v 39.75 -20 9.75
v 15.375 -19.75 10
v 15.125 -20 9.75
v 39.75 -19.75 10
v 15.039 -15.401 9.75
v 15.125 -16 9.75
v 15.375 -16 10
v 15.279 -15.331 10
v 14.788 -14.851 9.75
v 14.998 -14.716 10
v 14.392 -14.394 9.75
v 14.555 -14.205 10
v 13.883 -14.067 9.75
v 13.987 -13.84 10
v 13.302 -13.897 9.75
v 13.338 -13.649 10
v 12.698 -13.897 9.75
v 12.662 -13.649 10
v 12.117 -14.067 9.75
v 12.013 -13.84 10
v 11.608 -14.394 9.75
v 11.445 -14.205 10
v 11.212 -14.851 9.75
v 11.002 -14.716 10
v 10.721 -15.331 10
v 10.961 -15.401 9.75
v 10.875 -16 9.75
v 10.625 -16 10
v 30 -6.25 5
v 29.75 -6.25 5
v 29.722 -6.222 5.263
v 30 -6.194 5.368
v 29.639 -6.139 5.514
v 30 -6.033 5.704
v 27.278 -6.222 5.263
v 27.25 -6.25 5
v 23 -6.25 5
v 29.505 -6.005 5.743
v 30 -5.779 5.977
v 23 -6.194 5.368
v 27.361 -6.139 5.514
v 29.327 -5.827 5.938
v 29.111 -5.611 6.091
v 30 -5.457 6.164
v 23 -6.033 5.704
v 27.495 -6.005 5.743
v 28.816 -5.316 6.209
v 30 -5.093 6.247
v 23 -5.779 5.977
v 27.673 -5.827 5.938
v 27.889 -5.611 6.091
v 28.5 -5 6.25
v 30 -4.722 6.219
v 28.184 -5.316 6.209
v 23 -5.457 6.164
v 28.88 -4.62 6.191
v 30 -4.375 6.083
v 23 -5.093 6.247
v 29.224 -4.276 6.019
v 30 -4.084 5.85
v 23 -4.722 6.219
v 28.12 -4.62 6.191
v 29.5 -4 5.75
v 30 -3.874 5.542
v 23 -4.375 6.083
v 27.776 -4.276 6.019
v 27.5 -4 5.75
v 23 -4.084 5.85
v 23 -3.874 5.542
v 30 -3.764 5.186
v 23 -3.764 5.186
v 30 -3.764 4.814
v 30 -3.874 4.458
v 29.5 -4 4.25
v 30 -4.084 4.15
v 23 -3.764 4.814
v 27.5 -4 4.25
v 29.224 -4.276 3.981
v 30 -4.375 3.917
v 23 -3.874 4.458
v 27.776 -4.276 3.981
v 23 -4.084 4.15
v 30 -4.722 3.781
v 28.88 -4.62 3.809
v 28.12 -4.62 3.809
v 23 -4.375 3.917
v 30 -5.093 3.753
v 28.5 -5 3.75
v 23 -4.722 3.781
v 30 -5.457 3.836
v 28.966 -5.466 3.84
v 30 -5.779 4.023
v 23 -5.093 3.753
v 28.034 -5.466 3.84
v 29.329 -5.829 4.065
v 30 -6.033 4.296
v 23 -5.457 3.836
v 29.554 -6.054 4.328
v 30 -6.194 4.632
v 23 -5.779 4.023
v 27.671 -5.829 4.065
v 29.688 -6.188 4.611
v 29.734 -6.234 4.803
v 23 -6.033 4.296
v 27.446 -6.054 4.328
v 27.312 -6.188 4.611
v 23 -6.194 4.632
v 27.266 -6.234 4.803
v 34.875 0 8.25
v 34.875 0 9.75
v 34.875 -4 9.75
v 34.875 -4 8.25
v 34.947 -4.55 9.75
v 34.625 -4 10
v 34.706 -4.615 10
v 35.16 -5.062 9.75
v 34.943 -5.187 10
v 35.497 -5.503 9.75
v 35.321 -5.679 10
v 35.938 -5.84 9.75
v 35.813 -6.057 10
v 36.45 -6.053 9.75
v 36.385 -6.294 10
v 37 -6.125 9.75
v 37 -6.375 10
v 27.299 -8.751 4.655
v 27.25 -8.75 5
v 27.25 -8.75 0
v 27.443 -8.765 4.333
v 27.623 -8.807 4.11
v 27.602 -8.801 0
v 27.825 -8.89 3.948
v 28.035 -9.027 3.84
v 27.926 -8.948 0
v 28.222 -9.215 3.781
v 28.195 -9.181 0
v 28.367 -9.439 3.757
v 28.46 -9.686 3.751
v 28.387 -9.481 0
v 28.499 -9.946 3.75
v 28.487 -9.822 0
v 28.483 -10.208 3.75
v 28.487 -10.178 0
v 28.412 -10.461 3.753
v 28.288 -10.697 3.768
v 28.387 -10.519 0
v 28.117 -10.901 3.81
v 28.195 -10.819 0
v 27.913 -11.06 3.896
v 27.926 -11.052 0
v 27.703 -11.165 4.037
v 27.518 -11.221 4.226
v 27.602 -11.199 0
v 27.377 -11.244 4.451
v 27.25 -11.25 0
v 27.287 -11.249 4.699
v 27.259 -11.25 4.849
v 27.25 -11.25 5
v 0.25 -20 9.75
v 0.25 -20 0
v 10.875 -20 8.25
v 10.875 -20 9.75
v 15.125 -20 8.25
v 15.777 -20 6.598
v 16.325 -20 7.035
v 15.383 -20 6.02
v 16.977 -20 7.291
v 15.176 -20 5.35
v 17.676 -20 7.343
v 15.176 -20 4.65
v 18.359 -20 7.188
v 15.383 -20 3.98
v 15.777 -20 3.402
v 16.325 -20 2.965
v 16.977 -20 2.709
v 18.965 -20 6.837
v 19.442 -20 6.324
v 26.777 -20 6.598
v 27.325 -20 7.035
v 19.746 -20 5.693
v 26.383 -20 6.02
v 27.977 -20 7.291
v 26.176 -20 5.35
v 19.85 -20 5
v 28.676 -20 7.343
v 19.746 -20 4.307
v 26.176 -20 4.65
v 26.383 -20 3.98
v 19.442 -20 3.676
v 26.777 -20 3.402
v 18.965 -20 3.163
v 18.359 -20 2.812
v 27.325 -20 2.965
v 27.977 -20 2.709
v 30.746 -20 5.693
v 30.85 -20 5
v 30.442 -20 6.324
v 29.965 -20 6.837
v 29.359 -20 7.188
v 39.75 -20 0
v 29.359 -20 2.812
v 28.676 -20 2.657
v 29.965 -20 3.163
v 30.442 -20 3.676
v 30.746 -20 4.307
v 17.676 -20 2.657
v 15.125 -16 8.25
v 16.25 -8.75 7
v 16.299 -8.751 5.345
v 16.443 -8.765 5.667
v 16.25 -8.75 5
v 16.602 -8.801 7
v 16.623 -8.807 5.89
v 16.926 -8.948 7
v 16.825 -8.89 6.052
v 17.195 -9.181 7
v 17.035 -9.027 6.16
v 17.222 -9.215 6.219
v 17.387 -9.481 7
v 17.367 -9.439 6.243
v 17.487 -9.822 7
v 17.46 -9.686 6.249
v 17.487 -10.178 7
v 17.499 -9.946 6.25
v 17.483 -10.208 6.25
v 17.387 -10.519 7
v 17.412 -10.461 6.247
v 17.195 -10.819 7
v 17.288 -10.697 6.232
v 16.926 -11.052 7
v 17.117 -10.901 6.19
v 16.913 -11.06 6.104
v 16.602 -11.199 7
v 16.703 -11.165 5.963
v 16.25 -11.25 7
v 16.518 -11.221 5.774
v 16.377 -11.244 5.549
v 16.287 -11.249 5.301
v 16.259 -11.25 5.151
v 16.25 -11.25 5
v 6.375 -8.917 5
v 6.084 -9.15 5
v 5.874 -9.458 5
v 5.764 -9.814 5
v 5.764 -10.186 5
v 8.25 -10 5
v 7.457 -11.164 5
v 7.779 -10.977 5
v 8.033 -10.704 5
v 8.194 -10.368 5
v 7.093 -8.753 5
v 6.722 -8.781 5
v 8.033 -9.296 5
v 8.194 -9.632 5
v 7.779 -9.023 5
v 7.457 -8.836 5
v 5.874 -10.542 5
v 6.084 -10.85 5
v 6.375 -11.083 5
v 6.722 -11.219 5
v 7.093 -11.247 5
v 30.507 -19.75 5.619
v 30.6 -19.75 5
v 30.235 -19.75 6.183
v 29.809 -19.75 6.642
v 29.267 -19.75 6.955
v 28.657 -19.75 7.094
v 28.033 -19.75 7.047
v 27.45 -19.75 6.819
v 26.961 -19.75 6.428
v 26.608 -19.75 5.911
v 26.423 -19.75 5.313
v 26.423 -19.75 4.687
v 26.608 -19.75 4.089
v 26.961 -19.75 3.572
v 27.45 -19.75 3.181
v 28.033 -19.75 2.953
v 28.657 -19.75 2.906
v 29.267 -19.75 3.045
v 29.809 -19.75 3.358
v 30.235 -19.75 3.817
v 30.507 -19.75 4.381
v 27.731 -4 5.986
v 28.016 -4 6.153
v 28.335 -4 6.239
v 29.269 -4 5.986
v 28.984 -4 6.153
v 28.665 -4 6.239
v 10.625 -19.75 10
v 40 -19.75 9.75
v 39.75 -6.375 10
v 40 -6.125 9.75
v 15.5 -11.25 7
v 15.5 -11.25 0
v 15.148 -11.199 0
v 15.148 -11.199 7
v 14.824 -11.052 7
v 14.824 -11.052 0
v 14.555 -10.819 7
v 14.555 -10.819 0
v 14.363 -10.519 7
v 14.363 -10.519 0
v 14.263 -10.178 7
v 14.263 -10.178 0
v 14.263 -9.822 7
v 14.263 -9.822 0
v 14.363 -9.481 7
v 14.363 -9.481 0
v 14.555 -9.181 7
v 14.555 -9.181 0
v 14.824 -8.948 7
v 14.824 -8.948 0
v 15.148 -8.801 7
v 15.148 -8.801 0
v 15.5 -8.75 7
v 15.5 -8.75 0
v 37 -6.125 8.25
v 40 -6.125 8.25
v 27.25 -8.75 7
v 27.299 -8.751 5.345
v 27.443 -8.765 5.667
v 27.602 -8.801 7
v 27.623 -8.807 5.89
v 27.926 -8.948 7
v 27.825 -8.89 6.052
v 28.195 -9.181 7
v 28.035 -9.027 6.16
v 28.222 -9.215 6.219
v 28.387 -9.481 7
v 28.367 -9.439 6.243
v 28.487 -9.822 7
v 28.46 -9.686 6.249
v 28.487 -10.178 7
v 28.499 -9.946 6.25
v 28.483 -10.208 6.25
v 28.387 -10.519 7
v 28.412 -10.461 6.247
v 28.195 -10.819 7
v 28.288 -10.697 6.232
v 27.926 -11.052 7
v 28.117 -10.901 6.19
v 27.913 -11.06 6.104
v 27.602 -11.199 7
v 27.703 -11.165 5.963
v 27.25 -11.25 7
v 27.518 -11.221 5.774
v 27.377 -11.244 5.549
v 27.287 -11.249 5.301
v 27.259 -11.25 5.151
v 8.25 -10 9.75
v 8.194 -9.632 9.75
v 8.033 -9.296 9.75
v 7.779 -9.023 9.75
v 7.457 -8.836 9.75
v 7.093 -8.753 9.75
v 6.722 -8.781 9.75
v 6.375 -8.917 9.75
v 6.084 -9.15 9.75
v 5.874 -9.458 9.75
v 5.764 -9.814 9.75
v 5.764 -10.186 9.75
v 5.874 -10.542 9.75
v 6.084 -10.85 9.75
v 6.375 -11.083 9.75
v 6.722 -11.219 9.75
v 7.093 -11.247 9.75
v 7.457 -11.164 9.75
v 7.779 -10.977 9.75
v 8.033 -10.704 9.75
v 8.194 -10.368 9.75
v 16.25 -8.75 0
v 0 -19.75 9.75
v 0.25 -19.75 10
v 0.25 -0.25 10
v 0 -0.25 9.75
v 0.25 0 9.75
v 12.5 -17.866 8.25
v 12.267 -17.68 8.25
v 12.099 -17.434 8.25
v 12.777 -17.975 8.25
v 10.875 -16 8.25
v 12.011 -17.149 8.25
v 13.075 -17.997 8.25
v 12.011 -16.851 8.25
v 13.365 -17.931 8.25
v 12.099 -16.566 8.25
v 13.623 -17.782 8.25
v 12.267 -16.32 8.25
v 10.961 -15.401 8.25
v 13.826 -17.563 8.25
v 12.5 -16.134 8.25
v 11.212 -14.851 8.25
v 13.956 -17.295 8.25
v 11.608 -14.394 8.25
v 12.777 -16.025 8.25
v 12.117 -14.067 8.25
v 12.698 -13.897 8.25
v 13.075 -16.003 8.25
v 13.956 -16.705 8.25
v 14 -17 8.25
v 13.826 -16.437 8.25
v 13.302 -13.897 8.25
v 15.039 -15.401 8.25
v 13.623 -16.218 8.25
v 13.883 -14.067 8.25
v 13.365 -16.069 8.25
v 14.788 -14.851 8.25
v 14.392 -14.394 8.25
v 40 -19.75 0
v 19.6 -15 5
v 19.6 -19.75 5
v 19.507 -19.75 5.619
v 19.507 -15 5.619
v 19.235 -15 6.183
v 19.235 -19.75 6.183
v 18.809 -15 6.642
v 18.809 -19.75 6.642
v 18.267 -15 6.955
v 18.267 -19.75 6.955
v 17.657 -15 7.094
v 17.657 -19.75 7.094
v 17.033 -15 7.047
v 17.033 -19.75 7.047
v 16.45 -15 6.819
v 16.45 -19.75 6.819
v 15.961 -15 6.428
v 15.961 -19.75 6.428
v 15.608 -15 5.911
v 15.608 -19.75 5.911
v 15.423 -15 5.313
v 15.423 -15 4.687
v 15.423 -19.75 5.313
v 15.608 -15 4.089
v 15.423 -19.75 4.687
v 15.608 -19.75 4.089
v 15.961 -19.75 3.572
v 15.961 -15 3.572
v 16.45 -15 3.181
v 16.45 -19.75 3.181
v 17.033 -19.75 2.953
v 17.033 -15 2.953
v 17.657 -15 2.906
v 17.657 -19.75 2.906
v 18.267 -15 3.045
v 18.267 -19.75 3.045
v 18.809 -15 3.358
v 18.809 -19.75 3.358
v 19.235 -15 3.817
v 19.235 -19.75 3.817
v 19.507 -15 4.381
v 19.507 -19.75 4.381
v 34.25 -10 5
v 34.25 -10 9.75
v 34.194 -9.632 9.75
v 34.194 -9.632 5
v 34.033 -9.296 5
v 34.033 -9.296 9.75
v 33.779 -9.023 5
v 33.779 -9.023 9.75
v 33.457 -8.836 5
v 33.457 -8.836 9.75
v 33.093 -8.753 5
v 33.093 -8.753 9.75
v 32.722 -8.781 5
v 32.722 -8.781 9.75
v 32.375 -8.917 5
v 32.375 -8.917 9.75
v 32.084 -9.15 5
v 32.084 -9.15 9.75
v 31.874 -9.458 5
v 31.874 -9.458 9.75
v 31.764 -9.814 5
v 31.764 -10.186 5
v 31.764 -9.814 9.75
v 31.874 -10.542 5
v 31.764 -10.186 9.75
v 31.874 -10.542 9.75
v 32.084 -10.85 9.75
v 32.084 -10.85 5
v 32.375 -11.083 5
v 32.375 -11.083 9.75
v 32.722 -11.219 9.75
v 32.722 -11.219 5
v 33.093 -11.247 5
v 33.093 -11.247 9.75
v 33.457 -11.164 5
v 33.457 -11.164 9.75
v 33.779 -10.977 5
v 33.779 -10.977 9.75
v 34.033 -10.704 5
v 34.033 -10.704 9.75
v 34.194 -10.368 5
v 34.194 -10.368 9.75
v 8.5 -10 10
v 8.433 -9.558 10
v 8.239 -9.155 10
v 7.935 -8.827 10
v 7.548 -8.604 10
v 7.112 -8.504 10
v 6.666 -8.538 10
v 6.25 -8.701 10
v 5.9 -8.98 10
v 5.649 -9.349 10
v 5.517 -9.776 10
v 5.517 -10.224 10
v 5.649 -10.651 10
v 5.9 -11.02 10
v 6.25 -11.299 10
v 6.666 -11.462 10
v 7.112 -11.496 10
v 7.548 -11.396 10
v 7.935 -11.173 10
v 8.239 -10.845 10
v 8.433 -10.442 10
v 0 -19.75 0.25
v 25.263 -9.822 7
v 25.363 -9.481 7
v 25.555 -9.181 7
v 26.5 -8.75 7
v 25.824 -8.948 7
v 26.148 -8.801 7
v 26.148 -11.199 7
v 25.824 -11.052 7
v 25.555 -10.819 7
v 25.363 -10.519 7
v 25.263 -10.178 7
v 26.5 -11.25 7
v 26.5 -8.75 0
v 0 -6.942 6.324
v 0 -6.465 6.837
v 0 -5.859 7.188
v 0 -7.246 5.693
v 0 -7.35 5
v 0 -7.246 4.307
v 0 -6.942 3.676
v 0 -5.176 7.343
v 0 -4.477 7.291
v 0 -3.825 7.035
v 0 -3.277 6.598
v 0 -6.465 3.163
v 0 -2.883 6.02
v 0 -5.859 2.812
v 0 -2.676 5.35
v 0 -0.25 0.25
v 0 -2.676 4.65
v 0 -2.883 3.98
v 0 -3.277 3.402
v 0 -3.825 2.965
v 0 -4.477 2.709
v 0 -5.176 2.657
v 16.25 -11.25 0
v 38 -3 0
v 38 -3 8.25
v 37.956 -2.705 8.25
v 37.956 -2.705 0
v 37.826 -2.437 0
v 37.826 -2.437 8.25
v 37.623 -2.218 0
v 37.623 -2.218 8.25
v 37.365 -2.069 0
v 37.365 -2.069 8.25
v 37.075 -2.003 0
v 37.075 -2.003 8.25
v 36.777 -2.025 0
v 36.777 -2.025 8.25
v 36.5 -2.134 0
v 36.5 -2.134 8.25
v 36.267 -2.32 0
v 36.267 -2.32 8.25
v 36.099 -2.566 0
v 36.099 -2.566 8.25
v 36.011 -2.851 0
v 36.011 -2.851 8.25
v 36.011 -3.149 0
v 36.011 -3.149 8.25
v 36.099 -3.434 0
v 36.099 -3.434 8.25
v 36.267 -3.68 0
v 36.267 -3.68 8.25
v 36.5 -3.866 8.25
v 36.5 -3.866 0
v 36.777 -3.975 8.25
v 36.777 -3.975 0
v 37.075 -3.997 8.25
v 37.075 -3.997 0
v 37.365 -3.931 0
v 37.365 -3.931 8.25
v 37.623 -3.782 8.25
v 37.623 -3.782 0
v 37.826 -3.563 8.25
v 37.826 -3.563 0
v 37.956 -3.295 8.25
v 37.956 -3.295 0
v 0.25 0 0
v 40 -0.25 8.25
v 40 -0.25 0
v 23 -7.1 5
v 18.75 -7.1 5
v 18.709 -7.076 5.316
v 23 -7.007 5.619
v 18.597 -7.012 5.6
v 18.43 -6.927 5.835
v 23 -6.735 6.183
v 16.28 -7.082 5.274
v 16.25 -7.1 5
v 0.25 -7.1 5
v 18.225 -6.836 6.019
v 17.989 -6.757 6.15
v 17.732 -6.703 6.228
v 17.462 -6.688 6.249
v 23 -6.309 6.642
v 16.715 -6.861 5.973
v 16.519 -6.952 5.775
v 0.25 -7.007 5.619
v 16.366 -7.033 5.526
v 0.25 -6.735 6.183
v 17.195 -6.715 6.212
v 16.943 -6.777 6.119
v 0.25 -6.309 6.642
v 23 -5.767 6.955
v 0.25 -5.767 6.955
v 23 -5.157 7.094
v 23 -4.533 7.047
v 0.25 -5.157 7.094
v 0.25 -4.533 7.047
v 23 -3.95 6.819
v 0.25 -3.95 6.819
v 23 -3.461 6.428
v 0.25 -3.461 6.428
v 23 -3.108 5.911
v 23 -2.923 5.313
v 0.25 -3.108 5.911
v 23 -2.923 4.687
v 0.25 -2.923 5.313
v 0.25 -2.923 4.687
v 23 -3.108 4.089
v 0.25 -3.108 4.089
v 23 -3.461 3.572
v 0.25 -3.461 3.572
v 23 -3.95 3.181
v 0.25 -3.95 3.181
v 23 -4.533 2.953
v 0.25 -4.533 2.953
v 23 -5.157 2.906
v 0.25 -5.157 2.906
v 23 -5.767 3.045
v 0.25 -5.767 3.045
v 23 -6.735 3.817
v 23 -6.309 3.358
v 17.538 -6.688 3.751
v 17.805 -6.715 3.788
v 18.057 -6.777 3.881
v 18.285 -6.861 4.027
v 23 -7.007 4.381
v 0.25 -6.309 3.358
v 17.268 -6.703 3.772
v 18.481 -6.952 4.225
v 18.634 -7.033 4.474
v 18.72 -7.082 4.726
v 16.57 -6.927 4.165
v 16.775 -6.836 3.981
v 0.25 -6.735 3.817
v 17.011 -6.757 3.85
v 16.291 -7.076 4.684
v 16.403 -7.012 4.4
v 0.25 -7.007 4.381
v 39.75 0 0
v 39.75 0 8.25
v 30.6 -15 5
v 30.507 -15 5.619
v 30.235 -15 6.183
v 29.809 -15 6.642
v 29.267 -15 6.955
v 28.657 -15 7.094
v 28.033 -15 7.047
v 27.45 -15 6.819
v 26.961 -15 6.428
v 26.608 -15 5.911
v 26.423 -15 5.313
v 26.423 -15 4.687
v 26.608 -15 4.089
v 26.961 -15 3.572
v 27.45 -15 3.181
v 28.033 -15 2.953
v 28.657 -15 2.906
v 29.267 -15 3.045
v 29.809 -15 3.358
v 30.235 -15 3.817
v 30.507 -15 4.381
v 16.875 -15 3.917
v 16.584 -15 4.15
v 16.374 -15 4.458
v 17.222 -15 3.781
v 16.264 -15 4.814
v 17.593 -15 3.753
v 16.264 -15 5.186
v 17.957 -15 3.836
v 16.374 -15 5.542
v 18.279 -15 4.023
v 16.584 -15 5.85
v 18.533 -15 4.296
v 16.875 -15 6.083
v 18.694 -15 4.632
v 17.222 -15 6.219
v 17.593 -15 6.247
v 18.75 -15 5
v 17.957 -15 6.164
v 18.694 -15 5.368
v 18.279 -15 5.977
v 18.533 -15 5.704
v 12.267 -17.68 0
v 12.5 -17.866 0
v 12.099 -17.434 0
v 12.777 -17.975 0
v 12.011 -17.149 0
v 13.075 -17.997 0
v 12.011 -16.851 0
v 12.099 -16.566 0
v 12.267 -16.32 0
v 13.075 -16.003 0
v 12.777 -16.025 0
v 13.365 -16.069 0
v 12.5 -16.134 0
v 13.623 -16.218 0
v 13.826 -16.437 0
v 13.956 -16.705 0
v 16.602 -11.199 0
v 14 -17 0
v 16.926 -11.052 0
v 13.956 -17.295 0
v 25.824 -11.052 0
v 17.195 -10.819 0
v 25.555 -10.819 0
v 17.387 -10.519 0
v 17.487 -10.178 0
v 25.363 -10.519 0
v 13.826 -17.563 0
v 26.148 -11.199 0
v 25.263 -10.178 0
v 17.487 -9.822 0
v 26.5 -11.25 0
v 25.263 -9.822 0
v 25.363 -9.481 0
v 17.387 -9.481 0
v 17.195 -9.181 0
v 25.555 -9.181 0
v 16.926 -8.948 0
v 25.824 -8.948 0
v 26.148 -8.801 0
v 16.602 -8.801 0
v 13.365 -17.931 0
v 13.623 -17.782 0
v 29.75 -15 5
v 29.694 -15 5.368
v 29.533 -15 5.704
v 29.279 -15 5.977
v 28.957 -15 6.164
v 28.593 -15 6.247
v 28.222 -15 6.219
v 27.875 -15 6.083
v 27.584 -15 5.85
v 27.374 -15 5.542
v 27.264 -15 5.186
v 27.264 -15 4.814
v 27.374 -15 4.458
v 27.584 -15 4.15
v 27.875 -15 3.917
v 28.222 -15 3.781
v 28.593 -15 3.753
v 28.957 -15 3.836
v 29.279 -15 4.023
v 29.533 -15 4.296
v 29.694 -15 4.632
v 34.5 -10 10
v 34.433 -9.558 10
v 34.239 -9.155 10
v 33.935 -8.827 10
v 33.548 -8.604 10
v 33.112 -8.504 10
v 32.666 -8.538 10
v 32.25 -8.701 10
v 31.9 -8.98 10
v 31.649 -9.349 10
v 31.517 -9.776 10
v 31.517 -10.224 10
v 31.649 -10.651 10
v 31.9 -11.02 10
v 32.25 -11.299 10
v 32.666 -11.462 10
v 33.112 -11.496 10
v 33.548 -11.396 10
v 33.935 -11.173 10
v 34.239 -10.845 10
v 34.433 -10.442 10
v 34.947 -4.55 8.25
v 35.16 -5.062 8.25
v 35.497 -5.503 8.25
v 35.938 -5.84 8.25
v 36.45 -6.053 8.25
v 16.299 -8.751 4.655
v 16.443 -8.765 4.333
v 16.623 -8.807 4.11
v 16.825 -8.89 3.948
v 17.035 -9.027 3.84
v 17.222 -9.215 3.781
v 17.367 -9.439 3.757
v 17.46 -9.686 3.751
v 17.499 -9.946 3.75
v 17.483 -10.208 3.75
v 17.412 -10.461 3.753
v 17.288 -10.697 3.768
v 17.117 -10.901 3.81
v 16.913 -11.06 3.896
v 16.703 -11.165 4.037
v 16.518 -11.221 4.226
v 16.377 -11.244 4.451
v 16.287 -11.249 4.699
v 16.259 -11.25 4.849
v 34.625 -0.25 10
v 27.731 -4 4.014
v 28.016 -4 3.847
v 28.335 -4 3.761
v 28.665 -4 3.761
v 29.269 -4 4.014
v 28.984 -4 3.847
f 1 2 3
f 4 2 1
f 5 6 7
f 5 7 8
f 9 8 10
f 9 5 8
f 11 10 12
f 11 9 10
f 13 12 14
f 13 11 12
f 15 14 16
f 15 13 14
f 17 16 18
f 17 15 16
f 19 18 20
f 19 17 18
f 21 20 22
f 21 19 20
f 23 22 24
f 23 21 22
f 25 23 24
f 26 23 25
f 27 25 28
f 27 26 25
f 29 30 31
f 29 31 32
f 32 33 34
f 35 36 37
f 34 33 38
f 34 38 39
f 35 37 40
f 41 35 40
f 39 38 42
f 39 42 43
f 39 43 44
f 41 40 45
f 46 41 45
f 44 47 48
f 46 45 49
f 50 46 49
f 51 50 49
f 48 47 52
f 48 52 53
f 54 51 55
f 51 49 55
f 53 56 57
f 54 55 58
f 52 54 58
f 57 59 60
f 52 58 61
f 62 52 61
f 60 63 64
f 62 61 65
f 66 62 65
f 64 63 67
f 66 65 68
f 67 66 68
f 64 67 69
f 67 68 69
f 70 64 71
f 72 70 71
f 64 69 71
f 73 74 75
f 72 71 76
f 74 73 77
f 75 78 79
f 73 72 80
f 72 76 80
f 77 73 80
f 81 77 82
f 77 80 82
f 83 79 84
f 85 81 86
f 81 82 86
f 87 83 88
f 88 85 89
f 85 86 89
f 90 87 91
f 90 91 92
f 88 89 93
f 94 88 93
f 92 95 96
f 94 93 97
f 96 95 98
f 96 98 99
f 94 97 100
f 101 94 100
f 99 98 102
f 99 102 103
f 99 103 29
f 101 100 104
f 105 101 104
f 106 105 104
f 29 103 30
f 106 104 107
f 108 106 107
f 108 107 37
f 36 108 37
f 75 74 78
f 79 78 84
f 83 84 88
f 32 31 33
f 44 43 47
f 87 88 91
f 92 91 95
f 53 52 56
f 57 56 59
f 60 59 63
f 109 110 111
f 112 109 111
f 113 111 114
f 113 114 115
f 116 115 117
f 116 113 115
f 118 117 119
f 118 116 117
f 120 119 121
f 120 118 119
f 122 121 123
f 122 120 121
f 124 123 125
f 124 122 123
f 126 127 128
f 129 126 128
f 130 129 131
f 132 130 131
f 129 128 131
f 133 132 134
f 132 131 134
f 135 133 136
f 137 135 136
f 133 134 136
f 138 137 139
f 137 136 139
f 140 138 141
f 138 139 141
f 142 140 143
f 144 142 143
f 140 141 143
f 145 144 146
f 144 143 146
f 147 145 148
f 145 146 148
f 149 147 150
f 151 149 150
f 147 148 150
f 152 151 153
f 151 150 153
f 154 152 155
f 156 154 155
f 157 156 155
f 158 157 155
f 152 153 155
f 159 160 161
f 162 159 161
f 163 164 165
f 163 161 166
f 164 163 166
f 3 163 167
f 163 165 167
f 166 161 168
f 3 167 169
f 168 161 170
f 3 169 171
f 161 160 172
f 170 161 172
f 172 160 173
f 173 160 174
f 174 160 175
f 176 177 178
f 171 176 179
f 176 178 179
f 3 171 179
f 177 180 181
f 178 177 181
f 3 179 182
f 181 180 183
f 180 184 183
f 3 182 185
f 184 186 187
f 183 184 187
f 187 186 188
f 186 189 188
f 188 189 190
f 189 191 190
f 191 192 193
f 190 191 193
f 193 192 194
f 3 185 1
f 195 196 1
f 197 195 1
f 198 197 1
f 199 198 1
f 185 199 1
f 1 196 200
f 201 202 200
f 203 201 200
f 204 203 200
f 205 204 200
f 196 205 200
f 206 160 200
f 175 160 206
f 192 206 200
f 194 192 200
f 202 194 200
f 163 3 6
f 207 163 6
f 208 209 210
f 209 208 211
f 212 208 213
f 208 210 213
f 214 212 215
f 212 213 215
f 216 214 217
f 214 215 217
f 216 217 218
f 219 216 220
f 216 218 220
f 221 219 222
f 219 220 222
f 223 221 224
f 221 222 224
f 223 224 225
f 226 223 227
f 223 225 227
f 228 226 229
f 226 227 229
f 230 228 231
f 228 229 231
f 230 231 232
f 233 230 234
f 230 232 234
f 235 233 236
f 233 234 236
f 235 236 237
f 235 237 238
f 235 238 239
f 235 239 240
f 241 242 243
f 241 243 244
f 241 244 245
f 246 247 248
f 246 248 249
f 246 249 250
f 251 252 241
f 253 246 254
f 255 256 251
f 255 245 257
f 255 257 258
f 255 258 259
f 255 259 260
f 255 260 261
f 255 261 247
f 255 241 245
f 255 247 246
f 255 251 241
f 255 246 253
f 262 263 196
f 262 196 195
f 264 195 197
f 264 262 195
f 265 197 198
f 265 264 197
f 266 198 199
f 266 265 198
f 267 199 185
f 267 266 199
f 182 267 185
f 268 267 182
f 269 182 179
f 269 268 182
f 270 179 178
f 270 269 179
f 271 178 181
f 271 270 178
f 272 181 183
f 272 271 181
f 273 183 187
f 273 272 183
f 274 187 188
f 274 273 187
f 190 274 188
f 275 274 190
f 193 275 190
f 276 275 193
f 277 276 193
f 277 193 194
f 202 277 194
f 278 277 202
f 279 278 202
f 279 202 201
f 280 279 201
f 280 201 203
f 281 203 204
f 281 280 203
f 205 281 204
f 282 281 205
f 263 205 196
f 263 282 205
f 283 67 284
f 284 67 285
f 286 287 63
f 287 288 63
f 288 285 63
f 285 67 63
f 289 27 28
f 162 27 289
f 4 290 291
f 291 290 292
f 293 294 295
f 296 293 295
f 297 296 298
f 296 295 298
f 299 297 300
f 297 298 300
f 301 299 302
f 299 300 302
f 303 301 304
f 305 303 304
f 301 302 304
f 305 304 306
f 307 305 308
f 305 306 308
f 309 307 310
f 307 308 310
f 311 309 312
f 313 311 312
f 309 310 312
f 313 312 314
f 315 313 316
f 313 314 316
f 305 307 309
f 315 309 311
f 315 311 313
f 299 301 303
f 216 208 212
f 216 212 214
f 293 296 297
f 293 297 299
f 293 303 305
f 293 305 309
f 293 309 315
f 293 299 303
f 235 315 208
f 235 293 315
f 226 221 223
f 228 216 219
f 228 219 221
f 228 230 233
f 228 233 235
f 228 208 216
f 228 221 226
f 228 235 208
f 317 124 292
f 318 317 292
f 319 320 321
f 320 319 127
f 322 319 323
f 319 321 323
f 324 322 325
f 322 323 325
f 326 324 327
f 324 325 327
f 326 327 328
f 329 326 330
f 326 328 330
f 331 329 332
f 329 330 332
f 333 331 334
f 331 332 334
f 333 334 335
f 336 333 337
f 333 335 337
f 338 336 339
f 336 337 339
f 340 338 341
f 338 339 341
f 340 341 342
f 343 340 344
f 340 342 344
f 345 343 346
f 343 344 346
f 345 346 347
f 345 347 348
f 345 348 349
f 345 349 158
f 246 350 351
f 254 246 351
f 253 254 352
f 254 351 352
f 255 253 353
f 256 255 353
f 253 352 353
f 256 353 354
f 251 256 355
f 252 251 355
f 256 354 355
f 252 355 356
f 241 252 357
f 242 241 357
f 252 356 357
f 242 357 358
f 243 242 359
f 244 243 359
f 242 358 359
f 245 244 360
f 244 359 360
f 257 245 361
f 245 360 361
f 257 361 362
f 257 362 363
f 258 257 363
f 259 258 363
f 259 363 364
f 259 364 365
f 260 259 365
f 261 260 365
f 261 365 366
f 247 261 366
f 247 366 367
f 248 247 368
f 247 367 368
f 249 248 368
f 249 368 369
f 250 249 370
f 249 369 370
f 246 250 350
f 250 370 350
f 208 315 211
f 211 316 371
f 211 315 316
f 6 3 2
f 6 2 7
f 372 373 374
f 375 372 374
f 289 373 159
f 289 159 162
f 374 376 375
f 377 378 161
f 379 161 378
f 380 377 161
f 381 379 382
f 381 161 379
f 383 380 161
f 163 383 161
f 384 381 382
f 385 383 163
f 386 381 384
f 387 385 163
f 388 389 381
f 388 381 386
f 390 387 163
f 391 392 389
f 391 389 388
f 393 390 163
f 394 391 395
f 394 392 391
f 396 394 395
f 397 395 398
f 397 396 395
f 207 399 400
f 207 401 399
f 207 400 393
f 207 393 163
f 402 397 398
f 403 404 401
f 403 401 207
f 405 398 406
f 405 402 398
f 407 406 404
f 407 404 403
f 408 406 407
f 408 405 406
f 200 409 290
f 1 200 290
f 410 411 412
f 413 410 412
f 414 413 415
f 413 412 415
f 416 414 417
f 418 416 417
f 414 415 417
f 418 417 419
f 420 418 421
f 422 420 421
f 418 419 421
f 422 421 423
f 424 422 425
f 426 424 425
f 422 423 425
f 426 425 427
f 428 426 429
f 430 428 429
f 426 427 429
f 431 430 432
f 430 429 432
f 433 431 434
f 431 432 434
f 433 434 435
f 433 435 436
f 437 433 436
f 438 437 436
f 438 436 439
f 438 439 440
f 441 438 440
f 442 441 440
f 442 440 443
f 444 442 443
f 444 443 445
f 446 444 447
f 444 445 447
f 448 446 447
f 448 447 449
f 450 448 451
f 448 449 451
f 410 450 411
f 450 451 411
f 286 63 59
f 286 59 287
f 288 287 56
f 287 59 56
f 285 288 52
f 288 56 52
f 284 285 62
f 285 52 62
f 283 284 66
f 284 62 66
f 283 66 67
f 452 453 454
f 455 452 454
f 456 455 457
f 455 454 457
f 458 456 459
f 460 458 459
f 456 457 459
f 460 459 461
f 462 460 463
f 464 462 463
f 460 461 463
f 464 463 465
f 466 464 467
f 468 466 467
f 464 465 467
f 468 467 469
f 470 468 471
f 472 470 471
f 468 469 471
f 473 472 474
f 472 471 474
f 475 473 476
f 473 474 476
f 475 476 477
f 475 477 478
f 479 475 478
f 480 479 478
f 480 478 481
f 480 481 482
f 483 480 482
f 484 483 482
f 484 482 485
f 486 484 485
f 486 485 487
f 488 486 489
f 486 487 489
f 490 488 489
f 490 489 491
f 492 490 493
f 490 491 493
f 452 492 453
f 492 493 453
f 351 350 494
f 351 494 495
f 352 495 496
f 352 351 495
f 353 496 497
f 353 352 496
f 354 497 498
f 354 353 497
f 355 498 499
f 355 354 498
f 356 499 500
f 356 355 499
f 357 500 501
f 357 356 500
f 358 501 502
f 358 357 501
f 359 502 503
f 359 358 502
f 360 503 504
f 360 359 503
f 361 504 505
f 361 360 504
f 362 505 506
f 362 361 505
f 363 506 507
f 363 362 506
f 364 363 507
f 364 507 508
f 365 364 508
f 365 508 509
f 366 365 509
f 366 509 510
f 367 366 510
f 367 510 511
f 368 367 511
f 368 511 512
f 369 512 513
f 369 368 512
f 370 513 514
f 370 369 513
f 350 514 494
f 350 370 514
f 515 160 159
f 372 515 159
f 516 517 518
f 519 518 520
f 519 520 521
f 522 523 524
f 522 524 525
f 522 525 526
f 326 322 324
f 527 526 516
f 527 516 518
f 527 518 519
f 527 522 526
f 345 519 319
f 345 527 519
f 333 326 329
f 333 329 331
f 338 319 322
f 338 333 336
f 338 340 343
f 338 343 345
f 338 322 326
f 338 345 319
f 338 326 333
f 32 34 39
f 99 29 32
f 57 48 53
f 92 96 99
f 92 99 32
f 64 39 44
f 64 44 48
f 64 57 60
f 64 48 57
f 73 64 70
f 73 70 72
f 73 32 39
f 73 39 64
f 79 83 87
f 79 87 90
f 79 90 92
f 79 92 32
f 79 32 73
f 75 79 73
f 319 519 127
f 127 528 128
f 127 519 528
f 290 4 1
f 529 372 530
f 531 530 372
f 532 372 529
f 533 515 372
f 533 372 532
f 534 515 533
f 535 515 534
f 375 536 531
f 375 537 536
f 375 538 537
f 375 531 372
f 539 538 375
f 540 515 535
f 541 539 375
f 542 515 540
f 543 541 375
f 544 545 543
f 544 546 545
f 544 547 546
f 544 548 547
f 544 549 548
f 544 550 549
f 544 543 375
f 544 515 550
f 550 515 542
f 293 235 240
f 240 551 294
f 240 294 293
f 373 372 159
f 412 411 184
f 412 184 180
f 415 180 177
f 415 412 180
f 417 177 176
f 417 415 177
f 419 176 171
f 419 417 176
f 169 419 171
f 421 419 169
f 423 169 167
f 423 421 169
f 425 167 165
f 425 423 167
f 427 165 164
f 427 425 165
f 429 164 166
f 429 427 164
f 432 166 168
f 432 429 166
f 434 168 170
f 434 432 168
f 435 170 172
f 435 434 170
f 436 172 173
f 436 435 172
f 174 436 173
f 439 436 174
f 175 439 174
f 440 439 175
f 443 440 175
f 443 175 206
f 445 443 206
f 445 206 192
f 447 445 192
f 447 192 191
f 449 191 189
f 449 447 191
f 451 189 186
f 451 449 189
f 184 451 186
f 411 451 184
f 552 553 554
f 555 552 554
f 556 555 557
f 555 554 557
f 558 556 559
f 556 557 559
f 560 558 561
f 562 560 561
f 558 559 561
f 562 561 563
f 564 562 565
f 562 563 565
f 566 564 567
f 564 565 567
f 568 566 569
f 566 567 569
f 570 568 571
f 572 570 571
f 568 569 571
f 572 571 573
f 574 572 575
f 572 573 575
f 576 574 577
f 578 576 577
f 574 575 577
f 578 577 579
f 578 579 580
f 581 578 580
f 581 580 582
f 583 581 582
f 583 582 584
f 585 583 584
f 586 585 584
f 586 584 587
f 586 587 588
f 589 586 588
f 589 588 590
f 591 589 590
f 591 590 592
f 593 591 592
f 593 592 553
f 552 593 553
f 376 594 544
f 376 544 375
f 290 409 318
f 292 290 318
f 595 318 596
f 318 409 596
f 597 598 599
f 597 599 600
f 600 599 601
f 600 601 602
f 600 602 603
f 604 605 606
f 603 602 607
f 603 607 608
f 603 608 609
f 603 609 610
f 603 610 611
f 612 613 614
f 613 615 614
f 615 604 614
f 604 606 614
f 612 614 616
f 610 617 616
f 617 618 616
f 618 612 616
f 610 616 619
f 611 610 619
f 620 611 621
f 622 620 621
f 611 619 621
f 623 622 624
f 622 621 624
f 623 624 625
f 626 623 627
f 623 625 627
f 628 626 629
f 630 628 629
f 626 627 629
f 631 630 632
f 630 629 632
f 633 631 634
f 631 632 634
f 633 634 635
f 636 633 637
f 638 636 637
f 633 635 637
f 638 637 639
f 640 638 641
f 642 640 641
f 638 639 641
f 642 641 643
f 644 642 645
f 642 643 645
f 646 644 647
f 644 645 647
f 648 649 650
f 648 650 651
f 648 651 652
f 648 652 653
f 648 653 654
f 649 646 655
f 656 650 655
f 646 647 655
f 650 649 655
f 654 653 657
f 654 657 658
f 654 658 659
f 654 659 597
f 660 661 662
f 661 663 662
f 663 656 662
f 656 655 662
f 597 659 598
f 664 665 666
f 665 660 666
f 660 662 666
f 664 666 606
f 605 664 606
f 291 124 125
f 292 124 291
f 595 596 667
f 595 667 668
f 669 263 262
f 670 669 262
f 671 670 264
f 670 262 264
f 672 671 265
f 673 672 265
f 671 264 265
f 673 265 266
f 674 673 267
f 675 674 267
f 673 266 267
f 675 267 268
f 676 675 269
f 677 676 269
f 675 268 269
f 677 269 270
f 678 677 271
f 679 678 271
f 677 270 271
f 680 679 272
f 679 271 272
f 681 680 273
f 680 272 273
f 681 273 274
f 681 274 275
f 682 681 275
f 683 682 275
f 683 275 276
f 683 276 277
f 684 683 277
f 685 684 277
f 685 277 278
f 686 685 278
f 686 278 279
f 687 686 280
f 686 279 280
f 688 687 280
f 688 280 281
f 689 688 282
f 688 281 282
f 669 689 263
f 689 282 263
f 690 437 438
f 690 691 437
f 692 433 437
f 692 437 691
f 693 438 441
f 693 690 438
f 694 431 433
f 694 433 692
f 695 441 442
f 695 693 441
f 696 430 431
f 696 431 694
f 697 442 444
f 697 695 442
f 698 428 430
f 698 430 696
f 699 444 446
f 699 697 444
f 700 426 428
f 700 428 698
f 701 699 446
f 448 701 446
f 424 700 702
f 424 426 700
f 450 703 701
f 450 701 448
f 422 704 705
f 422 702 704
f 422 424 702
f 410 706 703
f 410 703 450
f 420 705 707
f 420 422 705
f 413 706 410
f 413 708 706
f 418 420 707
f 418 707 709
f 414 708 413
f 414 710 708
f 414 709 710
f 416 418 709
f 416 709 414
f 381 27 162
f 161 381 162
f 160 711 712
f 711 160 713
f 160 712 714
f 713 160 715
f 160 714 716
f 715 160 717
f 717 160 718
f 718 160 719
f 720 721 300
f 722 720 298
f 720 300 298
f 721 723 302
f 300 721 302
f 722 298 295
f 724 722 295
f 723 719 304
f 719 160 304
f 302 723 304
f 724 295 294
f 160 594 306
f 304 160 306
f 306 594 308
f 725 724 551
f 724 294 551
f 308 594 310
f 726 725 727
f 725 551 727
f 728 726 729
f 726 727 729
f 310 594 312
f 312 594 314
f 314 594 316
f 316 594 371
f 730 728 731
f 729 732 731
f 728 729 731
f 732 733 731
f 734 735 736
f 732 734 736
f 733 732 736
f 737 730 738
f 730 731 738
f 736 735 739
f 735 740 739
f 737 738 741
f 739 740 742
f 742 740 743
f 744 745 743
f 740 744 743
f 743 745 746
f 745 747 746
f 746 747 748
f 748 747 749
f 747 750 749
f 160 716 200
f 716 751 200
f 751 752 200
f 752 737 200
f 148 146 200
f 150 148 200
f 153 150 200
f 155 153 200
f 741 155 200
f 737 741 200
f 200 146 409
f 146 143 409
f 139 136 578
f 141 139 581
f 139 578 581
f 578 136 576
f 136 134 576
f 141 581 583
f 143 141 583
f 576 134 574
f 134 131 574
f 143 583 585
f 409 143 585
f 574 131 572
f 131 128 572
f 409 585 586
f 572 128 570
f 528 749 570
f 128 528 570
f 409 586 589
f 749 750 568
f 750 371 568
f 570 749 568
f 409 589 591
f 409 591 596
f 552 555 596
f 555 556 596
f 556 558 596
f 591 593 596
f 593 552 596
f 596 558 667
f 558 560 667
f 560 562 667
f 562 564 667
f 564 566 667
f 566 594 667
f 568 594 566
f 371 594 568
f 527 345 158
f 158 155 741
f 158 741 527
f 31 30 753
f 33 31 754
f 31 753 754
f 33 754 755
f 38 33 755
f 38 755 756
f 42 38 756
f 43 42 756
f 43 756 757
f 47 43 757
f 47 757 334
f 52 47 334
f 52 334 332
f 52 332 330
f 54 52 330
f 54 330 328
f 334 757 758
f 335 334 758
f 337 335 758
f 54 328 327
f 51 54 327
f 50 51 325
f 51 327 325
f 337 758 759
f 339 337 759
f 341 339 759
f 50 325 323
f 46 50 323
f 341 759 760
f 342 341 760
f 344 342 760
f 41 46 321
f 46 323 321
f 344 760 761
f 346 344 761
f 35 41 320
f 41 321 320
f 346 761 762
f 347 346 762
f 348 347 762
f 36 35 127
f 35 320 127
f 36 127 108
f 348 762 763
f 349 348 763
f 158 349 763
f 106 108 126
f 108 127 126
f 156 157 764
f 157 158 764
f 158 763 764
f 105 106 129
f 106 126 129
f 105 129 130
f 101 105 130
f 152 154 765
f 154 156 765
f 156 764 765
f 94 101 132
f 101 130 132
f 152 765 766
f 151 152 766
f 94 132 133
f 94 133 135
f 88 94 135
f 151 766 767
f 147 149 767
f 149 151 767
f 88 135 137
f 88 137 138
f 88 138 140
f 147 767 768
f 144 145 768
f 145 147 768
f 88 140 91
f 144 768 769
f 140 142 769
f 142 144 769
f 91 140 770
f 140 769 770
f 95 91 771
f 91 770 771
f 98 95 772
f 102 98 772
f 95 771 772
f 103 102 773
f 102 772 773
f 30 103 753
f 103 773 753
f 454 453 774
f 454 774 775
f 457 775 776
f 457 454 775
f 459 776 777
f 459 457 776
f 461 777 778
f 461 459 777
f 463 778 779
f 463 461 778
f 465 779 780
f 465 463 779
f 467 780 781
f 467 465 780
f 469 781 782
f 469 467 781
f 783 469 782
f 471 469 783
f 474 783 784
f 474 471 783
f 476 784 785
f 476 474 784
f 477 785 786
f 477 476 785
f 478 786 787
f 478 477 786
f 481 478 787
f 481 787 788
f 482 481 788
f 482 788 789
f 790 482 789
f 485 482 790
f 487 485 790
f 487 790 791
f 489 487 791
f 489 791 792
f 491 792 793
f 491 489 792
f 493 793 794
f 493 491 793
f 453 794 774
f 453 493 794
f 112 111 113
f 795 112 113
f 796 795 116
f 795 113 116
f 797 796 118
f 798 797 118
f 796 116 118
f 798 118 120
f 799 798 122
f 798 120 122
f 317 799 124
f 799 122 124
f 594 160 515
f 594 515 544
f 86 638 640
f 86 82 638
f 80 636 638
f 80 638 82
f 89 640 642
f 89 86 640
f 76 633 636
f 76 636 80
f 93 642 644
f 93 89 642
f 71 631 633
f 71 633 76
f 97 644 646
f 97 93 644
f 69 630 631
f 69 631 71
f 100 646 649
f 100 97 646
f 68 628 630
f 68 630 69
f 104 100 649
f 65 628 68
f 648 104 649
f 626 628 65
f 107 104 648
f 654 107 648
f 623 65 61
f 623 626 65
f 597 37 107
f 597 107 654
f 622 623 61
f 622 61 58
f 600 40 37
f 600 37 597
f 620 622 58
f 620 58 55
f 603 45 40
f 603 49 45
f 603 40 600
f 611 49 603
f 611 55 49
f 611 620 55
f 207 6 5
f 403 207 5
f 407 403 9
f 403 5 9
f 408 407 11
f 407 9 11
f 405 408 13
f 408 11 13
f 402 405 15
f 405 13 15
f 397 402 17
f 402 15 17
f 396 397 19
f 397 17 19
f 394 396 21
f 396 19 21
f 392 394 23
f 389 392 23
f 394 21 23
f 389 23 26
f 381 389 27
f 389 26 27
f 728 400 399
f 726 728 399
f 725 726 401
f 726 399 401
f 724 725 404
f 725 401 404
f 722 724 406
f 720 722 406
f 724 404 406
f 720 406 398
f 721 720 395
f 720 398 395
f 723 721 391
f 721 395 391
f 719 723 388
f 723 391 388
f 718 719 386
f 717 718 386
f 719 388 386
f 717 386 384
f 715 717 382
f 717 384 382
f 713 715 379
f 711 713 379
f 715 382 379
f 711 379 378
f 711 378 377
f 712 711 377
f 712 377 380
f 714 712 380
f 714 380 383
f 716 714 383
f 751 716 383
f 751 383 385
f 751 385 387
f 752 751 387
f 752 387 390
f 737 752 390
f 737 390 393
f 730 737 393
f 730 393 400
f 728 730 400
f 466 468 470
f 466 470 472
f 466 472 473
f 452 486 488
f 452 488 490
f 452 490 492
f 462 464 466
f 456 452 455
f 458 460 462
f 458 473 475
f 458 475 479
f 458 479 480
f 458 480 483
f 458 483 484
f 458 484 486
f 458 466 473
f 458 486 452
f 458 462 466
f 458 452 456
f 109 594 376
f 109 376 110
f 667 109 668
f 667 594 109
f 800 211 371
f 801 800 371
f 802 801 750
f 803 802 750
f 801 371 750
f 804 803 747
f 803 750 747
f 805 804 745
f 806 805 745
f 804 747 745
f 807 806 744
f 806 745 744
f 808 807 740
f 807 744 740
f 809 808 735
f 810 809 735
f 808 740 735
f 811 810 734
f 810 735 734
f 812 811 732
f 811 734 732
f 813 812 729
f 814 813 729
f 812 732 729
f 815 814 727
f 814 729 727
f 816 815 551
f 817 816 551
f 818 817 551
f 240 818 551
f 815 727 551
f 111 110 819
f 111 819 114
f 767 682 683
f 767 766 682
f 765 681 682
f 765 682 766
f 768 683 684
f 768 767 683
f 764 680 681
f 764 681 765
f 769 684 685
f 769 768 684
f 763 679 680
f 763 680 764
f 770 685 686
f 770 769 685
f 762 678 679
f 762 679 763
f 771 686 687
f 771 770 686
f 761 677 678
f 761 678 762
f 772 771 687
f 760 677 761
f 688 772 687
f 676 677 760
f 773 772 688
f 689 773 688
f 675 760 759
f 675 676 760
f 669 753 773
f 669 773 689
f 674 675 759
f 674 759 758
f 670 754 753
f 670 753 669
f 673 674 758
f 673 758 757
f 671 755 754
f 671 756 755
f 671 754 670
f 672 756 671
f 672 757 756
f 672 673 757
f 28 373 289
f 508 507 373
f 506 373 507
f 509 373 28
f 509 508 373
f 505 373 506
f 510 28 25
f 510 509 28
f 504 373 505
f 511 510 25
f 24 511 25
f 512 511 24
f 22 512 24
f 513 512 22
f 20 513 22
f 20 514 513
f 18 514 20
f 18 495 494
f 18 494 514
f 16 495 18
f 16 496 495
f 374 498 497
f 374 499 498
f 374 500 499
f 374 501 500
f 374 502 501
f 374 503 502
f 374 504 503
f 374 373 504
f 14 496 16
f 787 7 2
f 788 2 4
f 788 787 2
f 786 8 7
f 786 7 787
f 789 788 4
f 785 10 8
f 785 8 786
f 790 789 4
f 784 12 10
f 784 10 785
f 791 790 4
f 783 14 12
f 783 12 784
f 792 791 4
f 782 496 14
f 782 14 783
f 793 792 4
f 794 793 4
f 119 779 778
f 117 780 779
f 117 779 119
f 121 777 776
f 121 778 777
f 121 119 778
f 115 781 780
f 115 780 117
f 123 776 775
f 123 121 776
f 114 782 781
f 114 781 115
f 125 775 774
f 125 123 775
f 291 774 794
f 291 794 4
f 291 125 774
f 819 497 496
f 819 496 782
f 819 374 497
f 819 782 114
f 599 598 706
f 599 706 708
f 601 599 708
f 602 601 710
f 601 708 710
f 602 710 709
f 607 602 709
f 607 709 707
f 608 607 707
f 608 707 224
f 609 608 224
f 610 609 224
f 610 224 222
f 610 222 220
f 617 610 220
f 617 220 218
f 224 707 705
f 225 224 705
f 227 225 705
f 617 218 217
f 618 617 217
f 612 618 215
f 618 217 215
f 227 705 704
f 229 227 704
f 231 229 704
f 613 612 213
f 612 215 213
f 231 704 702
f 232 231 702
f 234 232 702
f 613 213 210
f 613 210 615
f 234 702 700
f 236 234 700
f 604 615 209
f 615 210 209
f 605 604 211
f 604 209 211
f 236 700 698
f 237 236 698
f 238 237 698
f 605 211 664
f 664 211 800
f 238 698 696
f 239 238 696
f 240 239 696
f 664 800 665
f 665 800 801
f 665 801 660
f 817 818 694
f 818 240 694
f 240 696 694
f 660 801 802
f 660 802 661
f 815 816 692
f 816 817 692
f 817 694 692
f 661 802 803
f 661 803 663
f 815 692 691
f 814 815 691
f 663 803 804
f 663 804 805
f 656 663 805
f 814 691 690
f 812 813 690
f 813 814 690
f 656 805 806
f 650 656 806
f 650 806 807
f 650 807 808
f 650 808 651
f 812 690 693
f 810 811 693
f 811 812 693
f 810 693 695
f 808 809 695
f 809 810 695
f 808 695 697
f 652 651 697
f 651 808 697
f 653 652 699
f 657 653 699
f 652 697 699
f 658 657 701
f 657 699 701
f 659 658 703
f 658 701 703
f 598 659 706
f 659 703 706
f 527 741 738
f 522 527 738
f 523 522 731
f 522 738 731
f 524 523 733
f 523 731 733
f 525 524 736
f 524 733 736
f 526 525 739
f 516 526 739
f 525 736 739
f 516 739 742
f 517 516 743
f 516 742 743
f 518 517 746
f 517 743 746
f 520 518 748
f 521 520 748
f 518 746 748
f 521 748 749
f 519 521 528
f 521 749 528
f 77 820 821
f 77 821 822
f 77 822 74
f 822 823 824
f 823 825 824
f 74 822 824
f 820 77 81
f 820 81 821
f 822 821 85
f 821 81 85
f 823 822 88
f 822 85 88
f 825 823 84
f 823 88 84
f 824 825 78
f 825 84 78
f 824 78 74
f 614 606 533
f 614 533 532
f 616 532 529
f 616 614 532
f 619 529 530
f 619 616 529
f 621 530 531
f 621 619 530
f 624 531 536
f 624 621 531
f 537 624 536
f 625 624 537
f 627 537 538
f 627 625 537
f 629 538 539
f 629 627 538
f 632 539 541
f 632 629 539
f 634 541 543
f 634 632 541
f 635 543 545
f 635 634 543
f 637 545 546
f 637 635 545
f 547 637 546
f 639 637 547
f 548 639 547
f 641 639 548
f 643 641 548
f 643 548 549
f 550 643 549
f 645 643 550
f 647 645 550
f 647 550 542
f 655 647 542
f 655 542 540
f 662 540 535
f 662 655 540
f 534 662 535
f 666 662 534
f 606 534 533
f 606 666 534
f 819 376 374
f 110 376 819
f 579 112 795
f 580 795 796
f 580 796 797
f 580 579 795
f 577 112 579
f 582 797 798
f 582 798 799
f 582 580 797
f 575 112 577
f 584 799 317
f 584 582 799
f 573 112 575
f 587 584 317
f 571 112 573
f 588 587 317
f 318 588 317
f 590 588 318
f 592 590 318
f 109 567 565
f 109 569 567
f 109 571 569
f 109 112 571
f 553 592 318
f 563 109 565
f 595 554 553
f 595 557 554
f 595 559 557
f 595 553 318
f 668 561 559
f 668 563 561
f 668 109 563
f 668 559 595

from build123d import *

# Parameters (mm, degrees)
F0_W      = 40
F0_H      = 20
F1_DEPTH  = 10
F2_R      = 2.1
F2_R_2    = 1.25
F3_DEPTH  = 5
F4_R      = 1
F6_DEPTH  = 25
F8_DEPTH  = 7
F10_DEPTH = 1.75
F9_R      = 2.1
F9_R_2    = 1.25
F11_DEPTH = 23
F12_R     = 1.25
F13_DEPTH = 5
F14_SIZE  = 0.25
F15_DEPTH = 30
F16_DEPTH = 16


# Not quite as in the source:
# - a feature names something its author has since deleted; it is built from what else it names


with BuildPart() as f1:
    # F0 (on Top) → F1 (new body)
    with BuildSketch(Plane.XY):
        with Locations((20, -10)):
            Rectangle(F0_W, F0_H)
    extrude(amount=F1_DEPTH)

    # F2 (on face) → F3 (cut)
    with BuildSketch(Plane.XZ.offset(20)):
        with Locations((28.5, 5)):
            Circle(F2_R)
        with Locations((28.5, 5)):
            Circle(F2_R_2, mode=Mode.SUBTRACT)
        with Locations((17.5, 5)):
            Circle(F2_R)
        with Locations((17.5, 5)):
            Circle(F2_R_2, mode=Mode.SUBTRACT)
    extrude(amount=-F3_DEPTH, mode=Mode.SUBTRACT)

    # F4 (on face) → F6 (cut)
    with BuildSketch(Plane.XY.offset(10)):
        with Locations((13, -17)):
            Circle(F4_R)
        with Locations((37, -3)):
            Circle(F4_R)
    extrude(amount=-F6_DEPTH, mode=Mode.SUBTRACT)

    # F7 (on face) → F8 (cut)
    with BuildSketch(Plane(origin=(0, 0, 0), x_dir=(1, 0, 0), z_dir=(0, 0, -1))):
        with BuildLine():
            Line((16.25, 11.25), (15.5, 11.25))
            ThreePointArc((15.5, 11.25), (14.25, 10), (15.5, 8.75))
            Line((15.5, 8.75), (16.25, 8.75))
            ThreePointArc((16.25, 8.75), (17.5, 10), (16.25, 11.25))
        make_face()
        with BuildLine():
            Line((27.25, 11.25), (26.5, 11.25))
            ThreePointArc((26.5, 11.25), (25.25, 10), (26.5, 8.75))
            Line((26.5, 8.75), (27.25, 8.75))
            ThreePointArc((27.25, 8.75), (28.5, 10), (27.25, 11.25))
        make_face()
    extrude(amount=-F8_DEPTH, mode=Mode.SUBTRACT)

    # F4 (on face) → F10 (cut)
    with BuildSketch(Plane.XY.offset(10)):
        with BuildLine():
            Line((15.125, -20), (15.125, -16))
            ThreePointArc((15.125, -16), (13, -13.875), (10.875, -16))
            Line((10.875, -16), (10.875, -20))
            Line((10.875, -20), (15.125, -20))
        make_face()
        with Locations((13, -17)):
            Circle(F4_R, mode=Mode.SUBTRACT)
        with BuildLine():
            Line((37, -6.125), (40, -6.125))
            Line((40, -6.125), (40, 0))
            Line((40, 0), (34.875, 0))
            Line((34.875, 0), (34.875, -4))
            ThreePointArc((34.875, -4), (35.49739809, -5.50260191), (37, -6.125))
        make_face()
        with Locations((37, -3)):
            Circle(F4_R, mode=Mode.SUBTRACT)
    extrude(amount=-F10_DEPTH, mode=Mode.SUBTRACT)

    # F9 (on face) → F11 (cut)
    with BuildSketch(Plane(origin=(0, 0, 0), x_dir=(0, -1, 0), z_dir=(-1, 0, 0))):
        with Locations((5, 5)):
            Circle(F9_R)
        with Locations((5, 5)):
            Circle(F9_R_2, mode=Mode.SUBTRACT)
    extrude(amount=-F11_DEPTH, mode=Mode.SUBTRACT)

    # F12 (on face) → F13 (cut)
    with BuildSketch(Plane.XY.offset(10)):
        with Locations((7, -10)):
            Circle(F12_R)
        with Locations((33, -10)):
            Circle(F12_R)
    extrude(amount=-F13_DEPTH, mode=Mode.SUBTRACT)

    # F14
    f14_edges = [f1.edges().sort_by_distance(p)[0] for p in [
        (15.4, -20, 5),
        (26.4, -20, 5),
        (0, 0, 5),
        (0, -20, 5),
        (34.875, -2, 10),
        (17.4375, 0, 10),
        (35.497398, -5.502602, 10),
        (0, -10, 10),
        (38.5, -6.125, 10),
        (5.4375, -20, 10),
        (40, -13.0625, 10),
        (10.875, -18, 10),
        (27.5625, -20, 10),
        (13, -13.875, 10),
        (15.125, -18, 10),
        (5.75, -10, 10),
        (31.75, -10, 10),
        (0, -10, 0),
        (40, -20, 5),
        (40, 0, 4.125),
        (0, -2.9, 5),
    ]]
    chamfer(f14_edges, length=F14_SIZE)

    # F15 (cut): a face of the model
    f15_faces = [f1.faces().sort_by_distance(p)[0] for p in [
        (0, -5, 5),
    ]]
    extrude(f15_faces, amount=-F15_DEPTH, mode=Mode.SUBTRACT)

    # F16 (cut): faces of the model
    f16_faces = [f1.faces().sort_by_distance(p)[0] for p in [
        (17.5, -20, 5),
        (28.5, -20, 5),
    ]]
    extrude(f16_faces, amount=-F16_DEPTH, mode=Mode.SUBTRACT)


solid = f1.part
